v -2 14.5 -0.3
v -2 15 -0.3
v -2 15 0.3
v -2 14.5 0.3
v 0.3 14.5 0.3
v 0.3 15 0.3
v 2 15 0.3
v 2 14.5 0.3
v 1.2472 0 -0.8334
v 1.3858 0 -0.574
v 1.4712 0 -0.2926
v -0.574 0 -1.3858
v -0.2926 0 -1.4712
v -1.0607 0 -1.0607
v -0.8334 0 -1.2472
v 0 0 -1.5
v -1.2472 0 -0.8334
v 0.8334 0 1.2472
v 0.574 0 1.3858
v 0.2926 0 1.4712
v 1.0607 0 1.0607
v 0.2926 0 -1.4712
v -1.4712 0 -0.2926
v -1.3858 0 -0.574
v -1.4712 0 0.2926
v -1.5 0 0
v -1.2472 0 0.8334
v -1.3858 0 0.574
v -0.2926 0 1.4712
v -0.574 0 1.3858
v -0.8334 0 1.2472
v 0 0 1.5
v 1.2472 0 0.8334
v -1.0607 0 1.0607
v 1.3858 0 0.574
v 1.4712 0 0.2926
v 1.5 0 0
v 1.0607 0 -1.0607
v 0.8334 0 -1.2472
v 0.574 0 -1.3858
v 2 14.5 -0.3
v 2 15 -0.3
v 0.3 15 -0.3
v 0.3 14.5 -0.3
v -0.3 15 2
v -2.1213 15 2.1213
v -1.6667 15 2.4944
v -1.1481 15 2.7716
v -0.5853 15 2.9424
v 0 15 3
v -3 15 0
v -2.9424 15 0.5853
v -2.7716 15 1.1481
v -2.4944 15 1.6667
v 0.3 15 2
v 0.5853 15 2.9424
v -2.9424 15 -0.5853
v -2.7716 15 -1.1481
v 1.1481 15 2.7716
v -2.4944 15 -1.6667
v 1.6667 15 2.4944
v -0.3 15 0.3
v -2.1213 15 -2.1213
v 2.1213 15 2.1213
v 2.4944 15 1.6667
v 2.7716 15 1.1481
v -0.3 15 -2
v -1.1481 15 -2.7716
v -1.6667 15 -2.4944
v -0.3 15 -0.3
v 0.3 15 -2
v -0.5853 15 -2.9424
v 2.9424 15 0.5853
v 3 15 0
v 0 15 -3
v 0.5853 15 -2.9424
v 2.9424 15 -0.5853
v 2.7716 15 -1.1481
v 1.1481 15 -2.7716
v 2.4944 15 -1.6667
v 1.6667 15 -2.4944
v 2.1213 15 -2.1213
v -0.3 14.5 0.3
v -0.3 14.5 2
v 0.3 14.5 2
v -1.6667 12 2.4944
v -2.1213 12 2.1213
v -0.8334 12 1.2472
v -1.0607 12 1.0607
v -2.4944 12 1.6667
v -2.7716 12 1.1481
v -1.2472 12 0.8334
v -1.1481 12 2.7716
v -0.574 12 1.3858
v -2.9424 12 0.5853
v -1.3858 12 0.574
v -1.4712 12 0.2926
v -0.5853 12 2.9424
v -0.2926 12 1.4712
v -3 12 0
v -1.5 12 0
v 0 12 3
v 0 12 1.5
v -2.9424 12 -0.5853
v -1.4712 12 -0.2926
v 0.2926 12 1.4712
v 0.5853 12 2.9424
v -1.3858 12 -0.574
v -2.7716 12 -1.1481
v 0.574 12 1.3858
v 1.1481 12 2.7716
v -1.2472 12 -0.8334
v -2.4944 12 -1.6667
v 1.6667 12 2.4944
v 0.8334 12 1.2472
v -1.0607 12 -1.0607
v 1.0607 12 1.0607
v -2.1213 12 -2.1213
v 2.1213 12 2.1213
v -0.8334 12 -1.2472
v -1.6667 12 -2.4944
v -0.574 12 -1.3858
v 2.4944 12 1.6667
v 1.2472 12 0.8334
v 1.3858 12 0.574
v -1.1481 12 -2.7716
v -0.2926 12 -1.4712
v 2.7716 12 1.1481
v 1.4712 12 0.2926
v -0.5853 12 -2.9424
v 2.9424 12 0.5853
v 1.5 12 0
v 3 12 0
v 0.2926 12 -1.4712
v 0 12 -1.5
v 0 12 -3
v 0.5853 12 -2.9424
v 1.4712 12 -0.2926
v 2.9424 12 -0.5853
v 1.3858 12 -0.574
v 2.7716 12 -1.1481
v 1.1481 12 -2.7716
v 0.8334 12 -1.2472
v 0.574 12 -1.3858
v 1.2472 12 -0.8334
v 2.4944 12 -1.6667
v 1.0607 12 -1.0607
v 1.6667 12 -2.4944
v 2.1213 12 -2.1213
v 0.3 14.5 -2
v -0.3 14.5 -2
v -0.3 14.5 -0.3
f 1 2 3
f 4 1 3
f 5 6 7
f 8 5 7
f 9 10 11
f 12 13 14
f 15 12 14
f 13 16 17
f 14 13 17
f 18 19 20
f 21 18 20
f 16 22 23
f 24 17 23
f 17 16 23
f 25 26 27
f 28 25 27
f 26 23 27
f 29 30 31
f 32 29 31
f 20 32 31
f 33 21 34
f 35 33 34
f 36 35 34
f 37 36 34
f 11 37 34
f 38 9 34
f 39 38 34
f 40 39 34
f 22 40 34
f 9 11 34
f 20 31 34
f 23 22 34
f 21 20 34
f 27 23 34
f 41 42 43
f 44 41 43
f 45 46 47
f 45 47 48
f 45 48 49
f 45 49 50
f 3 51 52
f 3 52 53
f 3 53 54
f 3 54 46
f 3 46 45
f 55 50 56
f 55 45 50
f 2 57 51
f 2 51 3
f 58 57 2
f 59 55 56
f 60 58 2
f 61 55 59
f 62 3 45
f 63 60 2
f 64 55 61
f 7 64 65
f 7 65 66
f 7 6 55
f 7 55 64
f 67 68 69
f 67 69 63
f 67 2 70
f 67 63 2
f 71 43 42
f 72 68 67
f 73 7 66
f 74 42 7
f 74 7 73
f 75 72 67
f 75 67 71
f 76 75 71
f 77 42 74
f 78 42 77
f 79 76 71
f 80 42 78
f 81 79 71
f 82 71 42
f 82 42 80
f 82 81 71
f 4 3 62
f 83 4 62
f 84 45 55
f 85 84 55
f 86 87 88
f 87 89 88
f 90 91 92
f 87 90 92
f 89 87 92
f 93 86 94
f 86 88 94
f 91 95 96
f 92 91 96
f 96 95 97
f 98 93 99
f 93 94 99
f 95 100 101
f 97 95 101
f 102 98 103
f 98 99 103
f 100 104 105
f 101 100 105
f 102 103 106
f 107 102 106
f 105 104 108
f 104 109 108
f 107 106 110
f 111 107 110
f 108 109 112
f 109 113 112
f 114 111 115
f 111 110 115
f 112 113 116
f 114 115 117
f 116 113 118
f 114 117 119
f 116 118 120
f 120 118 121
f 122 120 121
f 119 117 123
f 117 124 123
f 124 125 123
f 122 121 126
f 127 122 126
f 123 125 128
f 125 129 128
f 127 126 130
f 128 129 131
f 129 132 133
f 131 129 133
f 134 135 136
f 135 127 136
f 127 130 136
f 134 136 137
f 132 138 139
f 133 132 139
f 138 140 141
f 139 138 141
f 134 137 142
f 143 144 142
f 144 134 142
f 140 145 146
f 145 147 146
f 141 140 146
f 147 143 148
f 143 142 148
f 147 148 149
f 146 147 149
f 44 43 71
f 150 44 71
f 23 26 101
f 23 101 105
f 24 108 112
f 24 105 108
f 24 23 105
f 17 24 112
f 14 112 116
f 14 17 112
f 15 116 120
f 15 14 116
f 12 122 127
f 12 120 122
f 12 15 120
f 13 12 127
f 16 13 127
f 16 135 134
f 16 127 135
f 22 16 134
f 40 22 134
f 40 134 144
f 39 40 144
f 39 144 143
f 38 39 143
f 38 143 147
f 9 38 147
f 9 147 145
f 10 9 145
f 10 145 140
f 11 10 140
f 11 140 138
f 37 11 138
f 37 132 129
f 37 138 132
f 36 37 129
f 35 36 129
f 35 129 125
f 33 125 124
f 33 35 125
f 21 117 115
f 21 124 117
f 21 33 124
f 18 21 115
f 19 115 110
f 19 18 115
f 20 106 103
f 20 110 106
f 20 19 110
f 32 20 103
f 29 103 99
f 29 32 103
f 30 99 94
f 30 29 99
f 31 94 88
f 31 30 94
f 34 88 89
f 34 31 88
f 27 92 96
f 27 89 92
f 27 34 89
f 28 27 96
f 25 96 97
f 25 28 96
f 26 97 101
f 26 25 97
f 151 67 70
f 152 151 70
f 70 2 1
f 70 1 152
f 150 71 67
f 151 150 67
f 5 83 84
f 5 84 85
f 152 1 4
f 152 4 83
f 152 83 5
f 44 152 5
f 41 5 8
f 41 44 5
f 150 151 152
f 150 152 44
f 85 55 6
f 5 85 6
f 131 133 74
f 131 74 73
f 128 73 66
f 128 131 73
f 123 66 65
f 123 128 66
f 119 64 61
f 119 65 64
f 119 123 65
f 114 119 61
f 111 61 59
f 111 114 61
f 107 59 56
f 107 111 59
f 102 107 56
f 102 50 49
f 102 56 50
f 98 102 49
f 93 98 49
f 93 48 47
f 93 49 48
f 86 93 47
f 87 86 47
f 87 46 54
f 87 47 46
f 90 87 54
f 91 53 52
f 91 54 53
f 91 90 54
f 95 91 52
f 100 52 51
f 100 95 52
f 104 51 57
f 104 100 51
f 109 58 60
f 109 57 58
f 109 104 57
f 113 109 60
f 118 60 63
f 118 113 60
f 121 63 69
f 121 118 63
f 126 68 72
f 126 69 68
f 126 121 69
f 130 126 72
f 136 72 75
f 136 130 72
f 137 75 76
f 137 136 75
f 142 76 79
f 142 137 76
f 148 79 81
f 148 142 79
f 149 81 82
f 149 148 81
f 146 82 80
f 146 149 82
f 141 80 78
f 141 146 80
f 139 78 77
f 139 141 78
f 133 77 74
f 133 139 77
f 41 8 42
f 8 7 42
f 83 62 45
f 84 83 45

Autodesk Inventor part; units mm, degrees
ref_plane "YZ Plane" through (0, 0, 0) normal (1, 0, 0) x (0, 1, 0)
ref_plane "XZ Plane" through (0, 0, 0) normal (0, 1, 0) x (-1, 0, 0)
ref_plane "XY Plane" through (0, 0, 0) normal (0, 0, 1) x (1, 0, 0)
sketch "Sketch1" plane through (0, 0, 0) normal (0, 1, 0) x (-1, 0, 0)
  circle A0 centre (0, 0) radius 1.5
  dimension "d0" = 3
extrude "Extrusion1" add sketch "Sketch1" along normal blind 12
sketch "Sketch2" plane through (0, 12, 0) normal (0, 1, 0) x (1, 0, 0)
  circle A0 centre (0, 0) radius 3
  dimension "d3" = 6
extrude "Extrusion2" add sketch "Sketch2" along normal blind 3
sketch "Sketch3" plane through (0, 15, 0) normal (0, 1, 0) x (1, 0, 0)
  line L0 (-2, -0.3) -> (-0.3, -0.3)
  line L1 (-0.3, -0.3) -> (-0.3, -2)
  line L2 (-0.3, -2) -> (0.3, -2)
  line L3 (0.3, -2) -> (0.3, -0.3)
  line L4 (0.3, -0.3) -> (2, -0.3)
  line L5 (2, -0.3) -> (2, 0.3)
  line L6 (2, 0.3) -> (0.3, 0.3)
  line L7 (0.3, 0.3) -> (0.3, 2)
  line L8 (0.3, 2) -> (-0.3, 2)
  line L9 (-0.3, 2) -> (-0.3, 0.3)
  line L10 (-2, 0.3) -> (-2, -0.3)
  line L11 (-2, 0.3) -> (-0.3, 0.3)
  circle A0 centre (0, 0) radius 3 projected
  point P0 (0, 0)
  dimension "d19" = 0.3
  dimension "d20" = 0.3
  dimension "d22" = 2
  dimension "d23" = 0
  dimension "d26" = 0.3
  dimension "d27" = 0.3
extrude "Extrusion3" cut sketch "Sketch3" against normal blind 0.5 contours L10 L11 L9 L8 L7 L6 L5 L4 L3 L2 L1 L0
thread "Thread1" size "M3x0.5" class "6g" standard "ANSI Metric M Profile" full length
properties part number "BoltM3-PI" material "PC/ABS Plastic"
